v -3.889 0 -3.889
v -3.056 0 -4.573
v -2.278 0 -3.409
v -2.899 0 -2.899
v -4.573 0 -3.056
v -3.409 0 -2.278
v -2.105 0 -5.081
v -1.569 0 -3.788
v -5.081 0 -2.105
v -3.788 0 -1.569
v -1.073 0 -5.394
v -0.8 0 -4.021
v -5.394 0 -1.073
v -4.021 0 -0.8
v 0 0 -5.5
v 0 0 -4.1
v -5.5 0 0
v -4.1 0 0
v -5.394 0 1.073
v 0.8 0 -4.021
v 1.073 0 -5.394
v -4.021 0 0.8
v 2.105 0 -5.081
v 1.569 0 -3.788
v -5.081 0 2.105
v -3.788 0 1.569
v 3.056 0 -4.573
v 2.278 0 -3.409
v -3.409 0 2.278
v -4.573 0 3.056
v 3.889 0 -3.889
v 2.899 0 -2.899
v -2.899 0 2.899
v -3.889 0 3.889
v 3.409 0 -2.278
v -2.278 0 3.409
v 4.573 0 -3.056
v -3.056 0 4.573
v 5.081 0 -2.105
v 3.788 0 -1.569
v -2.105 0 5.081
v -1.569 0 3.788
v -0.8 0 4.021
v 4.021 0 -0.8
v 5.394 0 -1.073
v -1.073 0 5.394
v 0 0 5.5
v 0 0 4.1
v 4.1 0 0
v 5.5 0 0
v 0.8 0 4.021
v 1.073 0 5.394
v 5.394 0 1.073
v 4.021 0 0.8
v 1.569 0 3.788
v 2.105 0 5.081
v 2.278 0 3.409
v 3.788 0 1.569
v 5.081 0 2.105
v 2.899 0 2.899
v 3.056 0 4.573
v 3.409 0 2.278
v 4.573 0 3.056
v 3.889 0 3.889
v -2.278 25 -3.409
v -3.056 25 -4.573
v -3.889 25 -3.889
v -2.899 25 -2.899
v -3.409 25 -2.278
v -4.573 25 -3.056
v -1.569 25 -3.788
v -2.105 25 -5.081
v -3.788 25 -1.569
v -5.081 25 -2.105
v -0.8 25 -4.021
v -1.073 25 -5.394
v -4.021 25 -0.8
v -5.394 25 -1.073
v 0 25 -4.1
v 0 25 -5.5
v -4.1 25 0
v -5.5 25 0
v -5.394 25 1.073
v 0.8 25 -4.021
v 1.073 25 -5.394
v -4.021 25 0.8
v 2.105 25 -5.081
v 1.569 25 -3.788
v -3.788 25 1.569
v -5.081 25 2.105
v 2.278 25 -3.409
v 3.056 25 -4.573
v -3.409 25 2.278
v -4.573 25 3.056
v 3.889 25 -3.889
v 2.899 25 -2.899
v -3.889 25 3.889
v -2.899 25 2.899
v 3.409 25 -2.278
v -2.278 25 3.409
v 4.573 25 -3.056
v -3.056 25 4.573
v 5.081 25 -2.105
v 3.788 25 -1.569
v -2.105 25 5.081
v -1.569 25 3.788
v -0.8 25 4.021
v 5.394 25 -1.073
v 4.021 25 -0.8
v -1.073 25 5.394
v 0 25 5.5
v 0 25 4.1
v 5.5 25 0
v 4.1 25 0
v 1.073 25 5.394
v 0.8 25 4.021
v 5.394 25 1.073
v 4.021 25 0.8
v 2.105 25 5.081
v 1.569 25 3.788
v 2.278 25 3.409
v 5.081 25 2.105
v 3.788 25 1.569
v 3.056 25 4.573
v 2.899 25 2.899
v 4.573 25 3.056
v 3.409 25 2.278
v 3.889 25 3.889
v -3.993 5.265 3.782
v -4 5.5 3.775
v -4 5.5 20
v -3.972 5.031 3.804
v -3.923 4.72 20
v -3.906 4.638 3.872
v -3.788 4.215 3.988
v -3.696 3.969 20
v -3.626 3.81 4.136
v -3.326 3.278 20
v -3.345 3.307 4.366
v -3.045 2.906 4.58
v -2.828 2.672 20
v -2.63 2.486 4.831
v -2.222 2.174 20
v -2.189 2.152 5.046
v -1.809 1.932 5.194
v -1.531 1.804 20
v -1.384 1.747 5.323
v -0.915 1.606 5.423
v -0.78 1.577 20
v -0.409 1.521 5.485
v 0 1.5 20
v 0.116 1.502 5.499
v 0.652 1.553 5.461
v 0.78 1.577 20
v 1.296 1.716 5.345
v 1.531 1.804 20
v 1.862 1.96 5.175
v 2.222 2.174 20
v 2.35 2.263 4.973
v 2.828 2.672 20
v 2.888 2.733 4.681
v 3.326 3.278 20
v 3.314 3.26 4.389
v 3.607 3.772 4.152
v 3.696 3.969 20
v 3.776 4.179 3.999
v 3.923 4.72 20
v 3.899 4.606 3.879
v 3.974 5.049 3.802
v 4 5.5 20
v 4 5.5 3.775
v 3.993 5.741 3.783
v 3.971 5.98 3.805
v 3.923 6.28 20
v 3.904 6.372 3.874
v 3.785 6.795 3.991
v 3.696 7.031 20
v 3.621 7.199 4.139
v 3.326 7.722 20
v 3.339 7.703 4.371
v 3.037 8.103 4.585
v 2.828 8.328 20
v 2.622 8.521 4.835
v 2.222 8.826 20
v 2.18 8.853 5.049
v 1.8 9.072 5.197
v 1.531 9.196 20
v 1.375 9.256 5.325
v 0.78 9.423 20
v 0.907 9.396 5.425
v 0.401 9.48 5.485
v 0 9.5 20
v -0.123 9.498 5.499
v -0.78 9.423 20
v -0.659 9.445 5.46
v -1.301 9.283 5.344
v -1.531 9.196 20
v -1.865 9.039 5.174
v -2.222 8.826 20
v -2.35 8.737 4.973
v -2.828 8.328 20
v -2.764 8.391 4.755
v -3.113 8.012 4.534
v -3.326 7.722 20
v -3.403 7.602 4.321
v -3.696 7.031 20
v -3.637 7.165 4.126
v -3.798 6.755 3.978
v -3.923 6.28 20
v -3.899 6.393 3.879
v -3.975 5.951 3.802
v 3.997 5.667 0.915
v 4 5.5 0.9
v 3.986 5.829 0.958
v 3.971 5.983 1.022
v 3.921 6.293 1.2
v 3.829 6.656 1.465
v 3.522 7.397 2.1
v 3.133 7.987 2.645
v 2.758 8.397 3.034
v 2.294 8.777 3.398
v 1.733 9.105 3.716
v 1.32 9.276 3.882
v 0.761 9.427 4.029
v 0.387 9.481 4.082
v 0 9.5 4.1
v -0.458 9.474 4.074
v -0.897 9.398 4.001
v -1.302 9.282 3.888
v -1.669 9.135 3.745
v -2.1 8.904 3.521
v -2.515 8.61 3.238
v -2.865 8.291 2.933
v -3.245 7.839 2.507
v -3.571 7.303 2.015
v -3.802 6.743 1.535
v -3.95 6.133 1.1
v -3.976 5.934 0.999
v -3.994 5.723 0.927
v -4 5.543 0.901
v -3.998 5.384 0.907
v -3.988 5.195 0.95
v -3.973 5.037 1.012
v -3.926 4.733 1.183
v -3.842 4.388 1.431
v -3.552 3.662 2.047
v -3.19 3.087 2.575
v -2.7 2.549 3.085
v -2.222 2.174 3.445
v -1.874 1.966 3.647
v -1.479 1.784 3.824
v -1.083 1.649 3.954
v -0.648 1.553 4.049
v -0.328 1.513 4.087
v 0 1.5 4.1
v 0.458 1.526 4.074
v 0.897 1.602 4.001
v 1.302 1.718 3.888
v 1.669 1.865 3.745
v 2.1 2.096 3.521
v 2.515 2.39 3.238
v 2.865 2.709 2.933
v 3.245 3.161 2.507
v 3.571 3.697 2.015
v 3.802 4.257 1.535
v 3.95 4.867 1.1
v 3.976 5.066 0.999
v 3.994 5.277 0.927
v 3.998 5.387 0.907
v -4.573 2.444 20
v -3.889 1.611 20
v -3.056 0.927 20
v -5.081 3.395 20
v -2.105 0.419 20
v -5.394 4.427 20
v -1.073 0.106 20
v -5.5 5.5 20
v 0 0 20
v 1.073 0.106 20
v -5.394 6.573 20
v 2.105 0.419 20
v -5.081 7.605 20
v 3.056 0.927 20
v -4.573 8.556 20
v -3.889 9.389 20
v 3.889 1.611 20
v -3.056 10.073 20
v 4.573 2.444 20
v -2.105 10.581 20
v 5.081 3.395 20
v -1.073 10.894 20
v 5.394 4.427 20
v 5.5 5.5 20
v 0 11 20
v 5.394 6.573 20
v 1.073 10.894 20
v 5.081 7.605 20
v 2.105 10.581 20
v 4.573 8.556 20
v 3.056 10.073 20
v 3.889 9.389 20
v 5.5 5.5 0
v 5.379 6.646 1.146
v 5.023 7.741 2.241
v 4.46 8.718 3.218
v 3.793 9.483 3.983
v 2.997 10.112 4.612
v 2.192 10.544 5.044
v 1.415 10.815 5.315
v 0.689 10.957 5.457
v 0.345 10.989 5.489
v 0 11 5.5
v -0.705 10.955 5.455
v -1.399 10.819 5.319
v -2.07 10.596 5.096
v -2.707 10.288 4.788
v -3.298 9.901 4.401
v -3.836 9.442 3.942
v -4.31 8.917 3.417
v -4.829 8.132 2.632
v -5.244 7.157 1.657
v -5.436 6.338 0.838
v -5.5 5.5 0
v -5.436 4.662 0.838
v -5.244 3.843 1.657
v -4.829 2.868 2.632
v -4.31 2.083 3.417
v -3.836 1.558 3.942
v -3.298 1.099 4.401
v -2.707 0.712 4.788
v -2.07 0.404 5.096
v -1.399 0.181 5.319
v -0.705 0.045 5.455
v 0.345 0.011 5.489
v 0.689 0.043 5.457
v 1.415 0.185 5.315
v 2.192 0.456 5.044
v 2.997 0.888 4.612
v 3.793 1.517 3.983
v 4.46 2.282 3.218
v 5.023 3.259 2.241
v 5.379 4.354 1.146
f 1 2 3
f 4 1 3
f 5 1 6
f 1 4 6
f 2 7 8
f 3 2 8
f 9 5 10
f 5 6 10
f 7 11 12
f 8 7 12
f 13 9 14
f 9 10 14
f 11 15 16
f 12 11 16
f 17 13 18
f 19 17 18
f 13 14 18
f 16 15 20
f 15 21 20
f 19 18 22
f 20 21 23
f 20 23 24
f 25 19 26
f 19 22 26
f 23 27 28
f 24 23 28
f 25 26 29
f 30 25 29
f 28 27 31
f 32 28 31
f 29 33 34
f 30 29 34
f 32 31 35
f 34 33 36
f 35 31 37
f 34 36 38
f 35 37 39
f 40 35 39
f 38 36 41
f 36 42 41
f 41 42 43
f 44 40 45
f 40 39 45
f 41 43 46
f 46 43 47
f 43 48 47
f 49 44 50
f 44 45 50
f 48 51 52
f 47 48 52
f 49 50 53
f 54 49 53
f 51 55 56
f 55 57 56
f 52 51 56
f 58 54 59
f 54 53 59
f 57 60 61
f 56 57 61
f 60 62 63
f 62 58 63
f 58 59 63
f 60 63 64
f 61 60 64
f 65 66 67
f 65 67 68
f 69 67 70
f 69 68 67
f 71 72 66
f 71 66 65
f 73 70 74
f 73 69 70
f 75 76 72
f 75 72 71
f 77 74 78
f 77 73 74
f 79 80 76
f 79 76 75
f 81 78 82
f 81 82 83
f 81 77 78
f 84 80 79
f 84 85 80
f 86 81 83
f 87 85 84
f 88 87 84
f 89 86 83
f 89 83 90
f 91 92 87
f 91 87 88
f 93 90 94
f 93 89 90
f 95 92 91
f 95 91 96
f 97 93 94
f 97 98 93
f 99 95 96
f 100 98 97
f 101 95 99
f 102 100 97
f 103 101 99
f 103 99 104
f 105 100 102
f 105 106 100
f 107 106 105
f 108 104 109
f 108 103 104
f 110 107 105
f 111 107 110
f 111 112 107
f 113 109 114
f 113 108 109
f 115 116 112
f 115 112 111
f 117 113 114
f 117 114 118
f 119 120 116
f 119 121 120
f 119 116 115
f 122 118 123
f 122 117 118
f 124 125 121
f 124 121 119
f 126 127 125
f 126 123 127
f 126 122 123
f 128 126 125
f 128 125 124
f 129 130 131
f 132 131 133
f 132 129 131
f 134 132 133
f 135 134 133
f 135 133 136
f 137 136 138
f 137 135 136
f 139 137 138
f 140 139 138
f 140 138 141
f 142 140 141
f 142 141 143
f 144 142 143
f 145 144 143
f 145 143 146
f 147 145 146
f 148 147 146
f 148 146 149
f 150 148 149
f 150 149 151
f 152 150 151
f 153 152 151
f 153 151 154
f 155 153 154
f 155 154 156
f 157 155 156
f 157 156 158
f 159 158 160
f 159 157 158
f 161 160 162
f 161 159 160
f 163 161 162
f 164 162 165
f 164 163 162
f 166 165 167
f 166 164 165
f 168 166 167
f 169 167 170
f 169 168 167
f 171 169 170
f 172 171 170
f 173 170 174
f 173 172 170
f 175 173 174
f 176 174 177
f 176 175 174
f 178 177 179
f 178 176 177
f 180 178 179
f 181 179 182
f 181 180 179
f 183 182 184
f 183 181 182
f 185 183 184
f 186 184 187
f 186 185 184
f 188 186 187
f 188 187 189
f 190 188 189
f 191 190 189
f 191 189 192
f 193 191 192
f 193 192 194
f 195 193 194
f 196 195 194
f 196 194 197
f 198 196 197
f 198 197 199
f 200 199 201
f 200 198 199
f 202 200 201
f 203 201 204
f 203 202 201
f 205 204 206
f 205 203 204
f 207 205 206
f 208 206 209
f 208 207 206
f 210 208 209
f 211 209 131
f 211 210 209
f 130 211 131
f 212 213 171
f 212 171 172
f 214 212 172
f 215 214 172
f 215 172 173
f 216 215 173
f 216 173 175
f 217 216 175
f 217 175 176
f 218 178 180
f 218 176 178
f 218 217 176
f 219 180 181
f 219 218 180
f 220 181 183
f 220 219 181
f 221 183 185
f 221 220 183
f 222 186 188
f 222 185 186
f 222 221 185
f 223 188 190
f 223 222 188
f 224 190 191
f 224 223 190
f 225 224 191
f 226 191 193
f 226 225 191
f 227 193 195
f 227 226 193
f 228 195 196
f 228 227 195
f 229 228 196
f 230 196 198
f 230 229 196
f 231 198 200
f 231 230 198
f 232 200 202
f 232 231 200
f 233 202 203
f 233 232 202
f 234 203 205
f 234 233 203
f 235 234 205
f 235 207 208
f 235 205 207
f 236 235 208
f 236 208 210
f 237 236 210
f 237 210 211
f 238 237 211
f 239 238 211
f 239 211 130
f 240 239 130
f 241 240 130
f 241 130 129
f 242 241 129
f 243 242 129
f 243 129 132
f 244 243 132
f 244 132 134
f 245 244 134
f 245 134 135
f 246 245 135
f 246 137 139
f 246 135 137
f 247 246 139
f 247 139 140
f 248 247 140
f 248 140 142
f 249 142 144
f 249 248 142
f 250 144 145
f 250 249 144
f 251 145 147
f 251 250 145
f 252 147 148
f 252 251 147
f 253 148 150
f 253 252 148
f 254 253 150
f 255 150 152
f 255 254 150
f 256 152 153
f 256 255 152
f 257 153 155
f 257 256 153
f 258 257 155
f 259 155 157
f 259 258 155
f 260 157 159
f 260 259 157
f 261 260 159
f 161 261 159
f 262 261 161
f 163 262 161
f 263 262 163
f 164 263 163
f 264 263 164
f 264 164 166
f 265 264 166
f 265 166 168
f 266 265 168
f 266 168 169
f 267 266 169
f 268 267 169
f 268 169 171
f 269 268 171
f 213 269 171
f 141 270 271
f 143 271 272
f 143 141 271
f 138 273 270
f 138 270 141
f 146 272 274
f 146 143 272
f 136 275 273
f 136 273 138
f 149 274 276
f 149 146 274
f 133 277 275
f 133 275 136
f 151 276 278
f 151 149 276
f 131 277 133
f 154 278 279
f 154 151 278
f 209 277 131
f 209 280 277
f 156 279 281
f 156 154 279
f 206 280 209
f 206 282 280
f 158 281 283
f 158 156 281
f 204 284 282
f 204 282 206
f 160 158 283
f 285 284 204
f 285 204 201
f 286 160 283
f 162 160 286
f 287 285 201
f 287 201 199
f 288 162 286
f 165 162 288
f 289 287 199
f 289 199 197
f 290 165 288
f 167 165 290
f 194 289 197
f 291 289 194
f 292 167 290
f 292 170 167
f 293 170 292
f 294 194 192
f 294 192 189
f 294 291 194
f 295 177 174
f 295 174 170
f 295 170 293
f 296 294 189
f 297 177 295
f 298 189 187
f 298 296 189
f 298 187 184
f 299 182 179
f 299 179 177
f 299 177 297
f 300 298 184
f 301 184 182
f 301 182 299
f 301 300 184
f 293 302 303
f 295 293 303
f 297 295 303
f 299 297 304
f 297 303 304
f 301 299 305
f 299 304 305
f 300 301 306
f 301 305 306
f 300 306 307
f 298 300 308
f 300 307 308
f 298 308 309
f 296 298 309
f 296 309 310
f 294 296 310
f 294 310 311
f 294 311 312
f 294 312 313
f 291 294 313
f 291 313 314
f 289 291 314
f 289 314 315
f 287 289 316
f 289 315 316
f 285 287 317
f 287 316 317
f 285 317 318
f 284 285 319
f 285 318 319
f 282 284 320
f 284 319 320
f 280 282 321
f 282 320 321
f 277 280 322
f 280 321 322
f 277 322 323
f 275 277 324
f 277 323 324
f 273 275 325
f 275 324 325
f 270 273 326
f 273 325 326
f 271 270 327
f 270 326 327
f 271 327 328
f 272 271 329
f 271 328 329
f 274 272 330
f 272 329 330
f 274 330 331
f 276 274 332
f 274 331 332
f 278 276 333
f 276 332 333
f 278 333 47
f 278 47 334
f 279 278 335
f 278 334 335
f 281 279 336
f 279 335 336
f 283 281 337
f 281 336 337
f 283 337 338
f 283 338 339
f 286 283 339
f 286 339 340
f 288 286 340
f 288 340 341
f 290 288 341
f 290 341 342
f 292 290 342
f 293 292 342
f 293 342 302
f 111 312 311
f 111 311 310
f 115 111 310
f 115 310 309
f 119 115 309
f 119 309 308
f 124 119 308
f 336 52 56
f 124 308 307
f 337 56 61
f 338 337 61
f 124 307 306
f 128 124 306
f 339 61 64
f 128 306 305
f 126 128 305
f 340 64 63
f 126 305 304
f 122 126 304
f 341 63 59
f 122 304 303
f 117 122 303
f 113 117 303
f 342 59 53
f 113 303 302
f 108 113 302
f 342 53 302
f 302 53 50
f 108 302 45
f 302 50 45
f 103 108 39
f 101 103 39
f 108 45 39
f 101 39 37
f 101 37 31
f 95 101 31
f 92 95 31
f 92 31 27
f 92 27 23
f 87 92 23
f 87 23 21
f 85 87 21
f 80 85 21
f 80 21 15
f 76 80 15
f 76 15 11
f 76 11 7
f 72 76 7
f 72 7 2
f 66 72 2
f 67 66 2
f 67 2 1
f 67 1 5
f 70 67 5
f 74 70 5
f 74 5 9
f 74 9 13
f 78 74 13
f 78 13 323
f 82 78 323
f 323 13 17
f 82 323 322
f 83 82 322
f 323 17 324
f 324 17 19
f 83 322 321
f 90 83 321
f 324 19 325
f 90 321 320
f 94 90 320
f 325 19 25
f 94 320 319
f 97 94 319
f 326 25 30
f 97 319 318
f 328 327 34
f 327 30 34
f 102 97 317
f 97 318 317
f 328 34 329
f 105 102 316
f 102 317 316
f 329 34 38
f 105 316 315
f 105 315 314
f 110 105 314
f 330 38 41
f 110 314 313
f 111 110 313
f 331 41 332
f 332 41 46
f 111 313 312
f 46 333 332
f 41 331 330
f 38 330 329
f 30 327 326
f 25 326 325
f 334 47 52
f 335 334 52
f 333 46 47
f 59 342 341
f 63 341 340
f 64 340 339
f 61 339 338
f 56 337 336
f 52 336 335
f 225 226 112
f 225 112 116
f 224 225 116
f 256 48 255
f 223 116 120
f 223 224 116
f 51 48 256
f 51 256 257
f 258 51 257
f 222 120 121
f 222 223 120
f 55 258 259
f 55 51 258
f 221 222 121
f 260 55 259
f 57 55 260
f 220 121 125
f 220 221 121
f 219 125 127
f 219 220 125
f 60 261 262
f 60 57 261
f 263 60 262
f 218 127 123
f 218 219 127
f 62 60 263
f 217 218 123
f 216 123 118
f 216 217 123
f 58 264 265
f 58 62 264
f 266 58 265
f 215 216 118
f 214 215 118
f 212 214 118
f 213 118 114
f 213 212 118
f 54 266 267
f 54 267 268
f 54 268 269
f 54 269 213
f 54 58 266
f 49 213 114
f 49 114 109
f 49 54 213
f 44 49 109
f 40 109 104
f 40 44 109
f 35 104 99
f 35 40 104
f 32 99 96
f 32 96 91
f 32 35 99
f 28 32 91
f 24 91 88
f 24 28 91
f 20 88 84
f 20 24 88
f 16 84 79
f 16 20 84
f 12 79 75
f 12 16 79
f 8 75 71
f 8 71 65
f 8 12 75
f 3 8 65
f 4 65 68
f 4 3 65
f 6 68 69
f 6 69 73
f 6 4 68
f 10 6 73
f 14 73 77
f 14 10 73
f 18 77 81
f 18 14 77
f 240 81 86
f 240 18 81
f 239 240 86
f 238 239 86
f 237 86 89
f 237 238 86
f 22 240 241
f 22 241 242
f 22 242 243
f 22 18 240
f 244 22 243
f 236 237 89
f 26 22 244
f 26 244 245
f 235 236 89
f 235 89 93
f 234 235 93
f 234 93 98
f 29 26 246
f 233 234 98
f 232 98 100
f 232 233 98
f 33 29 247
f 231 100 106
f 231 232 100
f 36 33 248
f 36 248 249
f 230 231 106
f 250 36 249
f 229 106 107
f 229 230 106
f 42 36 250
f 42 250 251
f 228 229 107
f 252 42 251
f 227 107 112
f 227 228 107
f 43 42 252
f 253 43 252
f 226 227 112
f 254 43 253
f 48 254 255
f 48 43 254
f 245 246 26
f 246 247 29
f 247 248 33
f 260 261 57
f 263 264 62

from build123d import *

# Parameters (mm, degrees)
SKETCH_1_R          = 5.5
SKETCH_1_R_2        = 4.1
EXTRUDE_1_DEPTH     = 25
SKETCH_2_R          = 5.5
SKETCH_2_R_2        = 4
EXTRUDE_2_DEPTH     = 20
SKETCH_4_R          = 4.1
CUT_EXTRUDE_1_DEPTH = 20
CUT_EXTRUDE_START   = -20
SKETCH_5_R          = 4
CUT_EXTRUDE_2_DEPTH = 20


with BuildPart() as part:
    # 草图1 → 凸台-拉伸1 (new body)
    with BuildSketch(Plane(origin=(0, 0, 0), x_dir=(1, 0, 0), z_dir=(0, 1, 0))):
        with Locations(Location((0, 0, 0), (0, 0, 270))):
            Circle(SKETCH_1_R)
        with Locations(Location((0, 0, 0), (0, 0, 270))):
            Circle(SKETCH_1_R_2, mode=Mode.SUBTRACT)
    extrude(amount=EXTRUDE_1_DEPTH)

    # 草图2 → 凸台-拉伸2 (add)
    with BuildSketch(Plane.XY):
        with Locations((0, 5.5)):
            Circle(SKETCH_2_R)
        with Locations(Location((0, 5.5, 0), (0, 0, 180))):
            Circle(SKETCH_2_R_2, mode=Mode.SUBTRACT)
    extrude(amount=EXTRUDE_2_DEPTH)

    # 草图4 → 切除-拉伸1 (cut)
    with BuildSketch(Plane(origin=(0, 0, 0), x_dir=(1, 0, 0), z_dir=(0, 1, 0))):
        with Locations(Location((0, 0, 0), (0, 0, 270))):
            Circle(SKETCH_4_R)
    extrude(amount=CUT_EXTRUDE_1_DEPTH, mode=Mode.SUBTRACT)

    # 草图5 → 切除-拉伸2 (cut)
    with BuildSketch(Plane.XY.offset(20).offset(CUT_EXTRUDE_START)):
        with Locations((0, 5.5)):
            Circle(SKETCH_5_R)
    extrude(amount=CUT_EXTRUDE_2_DEPTH, mode=Mode.SUBTRACT)


solid = part.part
